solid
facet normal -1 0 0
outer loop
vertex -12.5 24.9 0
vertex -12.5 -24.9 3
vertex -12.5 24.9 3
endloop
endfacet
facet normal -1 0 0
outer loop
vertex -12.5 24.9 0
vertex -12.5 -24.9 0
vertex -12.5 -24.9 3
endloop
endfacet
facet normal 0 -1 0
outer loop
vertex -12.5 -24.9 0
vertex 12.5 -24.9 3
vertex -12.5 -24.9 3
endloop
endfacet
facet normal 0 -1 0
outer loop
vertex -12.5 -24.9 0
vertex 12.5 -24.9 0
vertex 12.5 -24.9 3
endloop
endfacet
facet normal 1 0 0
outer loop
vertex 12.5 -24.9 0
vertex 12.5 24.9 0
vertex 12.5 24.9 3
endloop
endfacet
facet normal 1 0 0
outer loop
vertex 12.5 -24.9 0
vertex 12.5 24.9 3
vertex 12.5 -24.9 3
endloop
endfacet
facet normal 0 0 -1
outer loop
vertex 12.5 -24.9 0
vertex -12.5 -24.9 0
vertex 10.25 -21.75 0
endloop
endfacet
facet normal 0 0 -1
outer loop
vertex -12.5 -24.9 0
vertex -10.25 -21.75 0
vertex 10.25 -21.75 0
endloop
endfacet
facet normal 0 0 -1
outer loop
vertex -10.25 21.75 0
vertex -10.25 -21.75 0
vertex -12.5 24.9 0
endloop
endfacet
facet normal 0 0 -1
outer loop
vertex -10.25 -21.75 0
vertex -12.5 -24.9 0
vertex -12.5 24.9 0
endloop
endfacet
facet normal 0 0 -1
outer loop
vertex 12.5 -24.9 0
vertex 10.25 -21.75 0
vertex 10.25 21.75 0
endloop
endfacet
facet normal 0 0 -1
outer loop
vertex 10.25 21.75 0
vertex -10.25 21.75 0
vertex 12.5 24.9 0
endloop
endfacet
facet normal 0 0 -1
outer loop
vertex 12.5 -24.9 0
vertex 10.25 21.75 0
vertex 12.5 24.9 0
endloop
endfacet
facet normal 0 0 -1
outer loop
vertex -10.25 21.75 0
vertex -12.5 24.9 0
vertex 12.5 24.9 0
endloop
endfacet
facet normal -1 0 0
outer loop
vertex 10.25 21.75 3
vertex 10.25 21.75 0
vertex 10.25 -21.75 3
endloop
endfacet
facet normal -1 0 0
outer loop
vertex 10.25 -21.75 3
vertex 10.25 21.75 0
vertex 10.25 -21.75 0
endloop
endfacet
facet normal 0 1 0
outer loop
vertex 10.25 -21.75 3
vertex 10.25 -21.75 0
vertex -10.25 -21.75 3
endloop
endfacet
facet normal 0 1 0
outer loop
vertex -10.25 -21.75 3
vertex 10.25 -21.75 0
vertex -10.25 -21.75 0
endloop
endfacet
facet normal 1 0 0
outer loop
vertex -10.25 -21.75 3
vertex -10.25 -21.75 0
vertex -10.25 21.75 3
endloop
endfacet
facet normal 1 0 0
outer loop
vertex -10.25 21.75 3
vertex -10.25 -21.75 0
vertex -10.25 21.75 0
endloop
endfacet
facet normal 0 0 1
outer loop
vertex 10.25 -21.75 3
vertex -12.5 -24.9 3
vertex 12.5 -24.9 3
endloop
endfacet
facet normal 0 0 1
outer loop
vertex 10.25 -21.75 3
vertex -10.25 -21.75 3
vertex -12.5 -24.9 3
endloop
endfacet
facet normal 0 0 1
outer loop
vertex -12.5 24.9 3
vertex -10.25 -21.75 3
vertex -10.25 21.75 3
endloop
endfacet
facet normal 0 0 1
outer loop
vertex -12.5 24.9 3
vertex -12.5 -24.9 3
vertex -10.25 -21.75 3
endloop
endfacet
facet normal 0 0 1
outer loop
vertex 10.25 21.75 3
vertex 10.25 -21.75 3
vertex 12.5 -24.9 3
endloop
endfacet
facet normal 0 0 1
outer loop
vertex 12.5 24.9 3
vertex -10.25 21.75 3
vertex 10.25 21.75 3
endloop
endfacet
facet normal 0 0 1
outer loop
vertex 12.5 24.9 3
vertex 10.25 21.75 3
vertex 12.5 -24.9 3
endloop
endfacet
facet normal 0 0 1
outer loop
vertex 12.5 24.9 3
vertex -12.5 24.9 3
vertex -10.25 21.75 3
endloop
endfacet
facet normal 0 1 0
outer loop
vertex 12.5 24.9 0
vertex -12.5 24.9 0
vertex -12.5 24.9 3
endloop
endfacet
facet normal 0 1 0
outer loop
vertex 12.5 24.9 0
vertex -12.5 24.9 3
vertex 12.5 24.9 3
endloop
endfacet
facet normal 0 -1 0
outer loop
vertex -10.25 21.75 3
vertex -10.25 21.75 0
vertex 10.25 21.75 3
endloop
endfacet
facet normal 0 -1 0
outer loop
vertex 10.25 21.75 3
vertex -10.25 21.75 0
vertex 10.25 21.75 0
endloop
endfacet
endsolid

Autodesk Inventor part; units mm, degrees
ref_plane "YZ Plane" through (0, 0, 0) normal (1, 0, 0) x (0, 1, 0)
ref_plane "XZ Plane" through (0, 0, 0) normal (0, 1, 0) x (-1, 0, 0)
ref_plane "XY Plane" through (0, 0, 0) normal (0, 0, 1) x (1, 0, 0)
sketch "Sketch1" plane through (0, 0, 0) normal (0, 0, 1) x (1, 0, 0)
  line L0 (-17.5, 0) -> (17.5, 0) construction
  line L1 (0, -34.86) -> (0, 34.86) construction
  line L2 (-12.5, 24.9) -> (12.5, 24.9)
  line L3 (12.5, 24.9) -> (12.5, -24.9)
  line L4 (12.5, -24.9) -> (-12.5, -24.9)
  line L5 (-12.5, -24.9) -> (-12.5, 24.9)
  line L6 (-10.25, 21.75) -> (10.25, 21.75)
  line L7 (10.25, 21.75) -> (10.25, -21.75)
  line L8 (10.25, -21.75) -> (-10.25, -21.75)
  line L9 (-10.25, -21.75) -> (-10.25, 21.75)
  point P0 (0, 0)
  dimension "d0" = 20.5
  dimension "d1" = 25
  dimension "d2" = 49.8
  dimension "d3" = 43.5
extrude "Extrusion1" add sketch "Sketch1" along normal blind 3
properties part number "20_Cube_Insert_Sample_clamp"
